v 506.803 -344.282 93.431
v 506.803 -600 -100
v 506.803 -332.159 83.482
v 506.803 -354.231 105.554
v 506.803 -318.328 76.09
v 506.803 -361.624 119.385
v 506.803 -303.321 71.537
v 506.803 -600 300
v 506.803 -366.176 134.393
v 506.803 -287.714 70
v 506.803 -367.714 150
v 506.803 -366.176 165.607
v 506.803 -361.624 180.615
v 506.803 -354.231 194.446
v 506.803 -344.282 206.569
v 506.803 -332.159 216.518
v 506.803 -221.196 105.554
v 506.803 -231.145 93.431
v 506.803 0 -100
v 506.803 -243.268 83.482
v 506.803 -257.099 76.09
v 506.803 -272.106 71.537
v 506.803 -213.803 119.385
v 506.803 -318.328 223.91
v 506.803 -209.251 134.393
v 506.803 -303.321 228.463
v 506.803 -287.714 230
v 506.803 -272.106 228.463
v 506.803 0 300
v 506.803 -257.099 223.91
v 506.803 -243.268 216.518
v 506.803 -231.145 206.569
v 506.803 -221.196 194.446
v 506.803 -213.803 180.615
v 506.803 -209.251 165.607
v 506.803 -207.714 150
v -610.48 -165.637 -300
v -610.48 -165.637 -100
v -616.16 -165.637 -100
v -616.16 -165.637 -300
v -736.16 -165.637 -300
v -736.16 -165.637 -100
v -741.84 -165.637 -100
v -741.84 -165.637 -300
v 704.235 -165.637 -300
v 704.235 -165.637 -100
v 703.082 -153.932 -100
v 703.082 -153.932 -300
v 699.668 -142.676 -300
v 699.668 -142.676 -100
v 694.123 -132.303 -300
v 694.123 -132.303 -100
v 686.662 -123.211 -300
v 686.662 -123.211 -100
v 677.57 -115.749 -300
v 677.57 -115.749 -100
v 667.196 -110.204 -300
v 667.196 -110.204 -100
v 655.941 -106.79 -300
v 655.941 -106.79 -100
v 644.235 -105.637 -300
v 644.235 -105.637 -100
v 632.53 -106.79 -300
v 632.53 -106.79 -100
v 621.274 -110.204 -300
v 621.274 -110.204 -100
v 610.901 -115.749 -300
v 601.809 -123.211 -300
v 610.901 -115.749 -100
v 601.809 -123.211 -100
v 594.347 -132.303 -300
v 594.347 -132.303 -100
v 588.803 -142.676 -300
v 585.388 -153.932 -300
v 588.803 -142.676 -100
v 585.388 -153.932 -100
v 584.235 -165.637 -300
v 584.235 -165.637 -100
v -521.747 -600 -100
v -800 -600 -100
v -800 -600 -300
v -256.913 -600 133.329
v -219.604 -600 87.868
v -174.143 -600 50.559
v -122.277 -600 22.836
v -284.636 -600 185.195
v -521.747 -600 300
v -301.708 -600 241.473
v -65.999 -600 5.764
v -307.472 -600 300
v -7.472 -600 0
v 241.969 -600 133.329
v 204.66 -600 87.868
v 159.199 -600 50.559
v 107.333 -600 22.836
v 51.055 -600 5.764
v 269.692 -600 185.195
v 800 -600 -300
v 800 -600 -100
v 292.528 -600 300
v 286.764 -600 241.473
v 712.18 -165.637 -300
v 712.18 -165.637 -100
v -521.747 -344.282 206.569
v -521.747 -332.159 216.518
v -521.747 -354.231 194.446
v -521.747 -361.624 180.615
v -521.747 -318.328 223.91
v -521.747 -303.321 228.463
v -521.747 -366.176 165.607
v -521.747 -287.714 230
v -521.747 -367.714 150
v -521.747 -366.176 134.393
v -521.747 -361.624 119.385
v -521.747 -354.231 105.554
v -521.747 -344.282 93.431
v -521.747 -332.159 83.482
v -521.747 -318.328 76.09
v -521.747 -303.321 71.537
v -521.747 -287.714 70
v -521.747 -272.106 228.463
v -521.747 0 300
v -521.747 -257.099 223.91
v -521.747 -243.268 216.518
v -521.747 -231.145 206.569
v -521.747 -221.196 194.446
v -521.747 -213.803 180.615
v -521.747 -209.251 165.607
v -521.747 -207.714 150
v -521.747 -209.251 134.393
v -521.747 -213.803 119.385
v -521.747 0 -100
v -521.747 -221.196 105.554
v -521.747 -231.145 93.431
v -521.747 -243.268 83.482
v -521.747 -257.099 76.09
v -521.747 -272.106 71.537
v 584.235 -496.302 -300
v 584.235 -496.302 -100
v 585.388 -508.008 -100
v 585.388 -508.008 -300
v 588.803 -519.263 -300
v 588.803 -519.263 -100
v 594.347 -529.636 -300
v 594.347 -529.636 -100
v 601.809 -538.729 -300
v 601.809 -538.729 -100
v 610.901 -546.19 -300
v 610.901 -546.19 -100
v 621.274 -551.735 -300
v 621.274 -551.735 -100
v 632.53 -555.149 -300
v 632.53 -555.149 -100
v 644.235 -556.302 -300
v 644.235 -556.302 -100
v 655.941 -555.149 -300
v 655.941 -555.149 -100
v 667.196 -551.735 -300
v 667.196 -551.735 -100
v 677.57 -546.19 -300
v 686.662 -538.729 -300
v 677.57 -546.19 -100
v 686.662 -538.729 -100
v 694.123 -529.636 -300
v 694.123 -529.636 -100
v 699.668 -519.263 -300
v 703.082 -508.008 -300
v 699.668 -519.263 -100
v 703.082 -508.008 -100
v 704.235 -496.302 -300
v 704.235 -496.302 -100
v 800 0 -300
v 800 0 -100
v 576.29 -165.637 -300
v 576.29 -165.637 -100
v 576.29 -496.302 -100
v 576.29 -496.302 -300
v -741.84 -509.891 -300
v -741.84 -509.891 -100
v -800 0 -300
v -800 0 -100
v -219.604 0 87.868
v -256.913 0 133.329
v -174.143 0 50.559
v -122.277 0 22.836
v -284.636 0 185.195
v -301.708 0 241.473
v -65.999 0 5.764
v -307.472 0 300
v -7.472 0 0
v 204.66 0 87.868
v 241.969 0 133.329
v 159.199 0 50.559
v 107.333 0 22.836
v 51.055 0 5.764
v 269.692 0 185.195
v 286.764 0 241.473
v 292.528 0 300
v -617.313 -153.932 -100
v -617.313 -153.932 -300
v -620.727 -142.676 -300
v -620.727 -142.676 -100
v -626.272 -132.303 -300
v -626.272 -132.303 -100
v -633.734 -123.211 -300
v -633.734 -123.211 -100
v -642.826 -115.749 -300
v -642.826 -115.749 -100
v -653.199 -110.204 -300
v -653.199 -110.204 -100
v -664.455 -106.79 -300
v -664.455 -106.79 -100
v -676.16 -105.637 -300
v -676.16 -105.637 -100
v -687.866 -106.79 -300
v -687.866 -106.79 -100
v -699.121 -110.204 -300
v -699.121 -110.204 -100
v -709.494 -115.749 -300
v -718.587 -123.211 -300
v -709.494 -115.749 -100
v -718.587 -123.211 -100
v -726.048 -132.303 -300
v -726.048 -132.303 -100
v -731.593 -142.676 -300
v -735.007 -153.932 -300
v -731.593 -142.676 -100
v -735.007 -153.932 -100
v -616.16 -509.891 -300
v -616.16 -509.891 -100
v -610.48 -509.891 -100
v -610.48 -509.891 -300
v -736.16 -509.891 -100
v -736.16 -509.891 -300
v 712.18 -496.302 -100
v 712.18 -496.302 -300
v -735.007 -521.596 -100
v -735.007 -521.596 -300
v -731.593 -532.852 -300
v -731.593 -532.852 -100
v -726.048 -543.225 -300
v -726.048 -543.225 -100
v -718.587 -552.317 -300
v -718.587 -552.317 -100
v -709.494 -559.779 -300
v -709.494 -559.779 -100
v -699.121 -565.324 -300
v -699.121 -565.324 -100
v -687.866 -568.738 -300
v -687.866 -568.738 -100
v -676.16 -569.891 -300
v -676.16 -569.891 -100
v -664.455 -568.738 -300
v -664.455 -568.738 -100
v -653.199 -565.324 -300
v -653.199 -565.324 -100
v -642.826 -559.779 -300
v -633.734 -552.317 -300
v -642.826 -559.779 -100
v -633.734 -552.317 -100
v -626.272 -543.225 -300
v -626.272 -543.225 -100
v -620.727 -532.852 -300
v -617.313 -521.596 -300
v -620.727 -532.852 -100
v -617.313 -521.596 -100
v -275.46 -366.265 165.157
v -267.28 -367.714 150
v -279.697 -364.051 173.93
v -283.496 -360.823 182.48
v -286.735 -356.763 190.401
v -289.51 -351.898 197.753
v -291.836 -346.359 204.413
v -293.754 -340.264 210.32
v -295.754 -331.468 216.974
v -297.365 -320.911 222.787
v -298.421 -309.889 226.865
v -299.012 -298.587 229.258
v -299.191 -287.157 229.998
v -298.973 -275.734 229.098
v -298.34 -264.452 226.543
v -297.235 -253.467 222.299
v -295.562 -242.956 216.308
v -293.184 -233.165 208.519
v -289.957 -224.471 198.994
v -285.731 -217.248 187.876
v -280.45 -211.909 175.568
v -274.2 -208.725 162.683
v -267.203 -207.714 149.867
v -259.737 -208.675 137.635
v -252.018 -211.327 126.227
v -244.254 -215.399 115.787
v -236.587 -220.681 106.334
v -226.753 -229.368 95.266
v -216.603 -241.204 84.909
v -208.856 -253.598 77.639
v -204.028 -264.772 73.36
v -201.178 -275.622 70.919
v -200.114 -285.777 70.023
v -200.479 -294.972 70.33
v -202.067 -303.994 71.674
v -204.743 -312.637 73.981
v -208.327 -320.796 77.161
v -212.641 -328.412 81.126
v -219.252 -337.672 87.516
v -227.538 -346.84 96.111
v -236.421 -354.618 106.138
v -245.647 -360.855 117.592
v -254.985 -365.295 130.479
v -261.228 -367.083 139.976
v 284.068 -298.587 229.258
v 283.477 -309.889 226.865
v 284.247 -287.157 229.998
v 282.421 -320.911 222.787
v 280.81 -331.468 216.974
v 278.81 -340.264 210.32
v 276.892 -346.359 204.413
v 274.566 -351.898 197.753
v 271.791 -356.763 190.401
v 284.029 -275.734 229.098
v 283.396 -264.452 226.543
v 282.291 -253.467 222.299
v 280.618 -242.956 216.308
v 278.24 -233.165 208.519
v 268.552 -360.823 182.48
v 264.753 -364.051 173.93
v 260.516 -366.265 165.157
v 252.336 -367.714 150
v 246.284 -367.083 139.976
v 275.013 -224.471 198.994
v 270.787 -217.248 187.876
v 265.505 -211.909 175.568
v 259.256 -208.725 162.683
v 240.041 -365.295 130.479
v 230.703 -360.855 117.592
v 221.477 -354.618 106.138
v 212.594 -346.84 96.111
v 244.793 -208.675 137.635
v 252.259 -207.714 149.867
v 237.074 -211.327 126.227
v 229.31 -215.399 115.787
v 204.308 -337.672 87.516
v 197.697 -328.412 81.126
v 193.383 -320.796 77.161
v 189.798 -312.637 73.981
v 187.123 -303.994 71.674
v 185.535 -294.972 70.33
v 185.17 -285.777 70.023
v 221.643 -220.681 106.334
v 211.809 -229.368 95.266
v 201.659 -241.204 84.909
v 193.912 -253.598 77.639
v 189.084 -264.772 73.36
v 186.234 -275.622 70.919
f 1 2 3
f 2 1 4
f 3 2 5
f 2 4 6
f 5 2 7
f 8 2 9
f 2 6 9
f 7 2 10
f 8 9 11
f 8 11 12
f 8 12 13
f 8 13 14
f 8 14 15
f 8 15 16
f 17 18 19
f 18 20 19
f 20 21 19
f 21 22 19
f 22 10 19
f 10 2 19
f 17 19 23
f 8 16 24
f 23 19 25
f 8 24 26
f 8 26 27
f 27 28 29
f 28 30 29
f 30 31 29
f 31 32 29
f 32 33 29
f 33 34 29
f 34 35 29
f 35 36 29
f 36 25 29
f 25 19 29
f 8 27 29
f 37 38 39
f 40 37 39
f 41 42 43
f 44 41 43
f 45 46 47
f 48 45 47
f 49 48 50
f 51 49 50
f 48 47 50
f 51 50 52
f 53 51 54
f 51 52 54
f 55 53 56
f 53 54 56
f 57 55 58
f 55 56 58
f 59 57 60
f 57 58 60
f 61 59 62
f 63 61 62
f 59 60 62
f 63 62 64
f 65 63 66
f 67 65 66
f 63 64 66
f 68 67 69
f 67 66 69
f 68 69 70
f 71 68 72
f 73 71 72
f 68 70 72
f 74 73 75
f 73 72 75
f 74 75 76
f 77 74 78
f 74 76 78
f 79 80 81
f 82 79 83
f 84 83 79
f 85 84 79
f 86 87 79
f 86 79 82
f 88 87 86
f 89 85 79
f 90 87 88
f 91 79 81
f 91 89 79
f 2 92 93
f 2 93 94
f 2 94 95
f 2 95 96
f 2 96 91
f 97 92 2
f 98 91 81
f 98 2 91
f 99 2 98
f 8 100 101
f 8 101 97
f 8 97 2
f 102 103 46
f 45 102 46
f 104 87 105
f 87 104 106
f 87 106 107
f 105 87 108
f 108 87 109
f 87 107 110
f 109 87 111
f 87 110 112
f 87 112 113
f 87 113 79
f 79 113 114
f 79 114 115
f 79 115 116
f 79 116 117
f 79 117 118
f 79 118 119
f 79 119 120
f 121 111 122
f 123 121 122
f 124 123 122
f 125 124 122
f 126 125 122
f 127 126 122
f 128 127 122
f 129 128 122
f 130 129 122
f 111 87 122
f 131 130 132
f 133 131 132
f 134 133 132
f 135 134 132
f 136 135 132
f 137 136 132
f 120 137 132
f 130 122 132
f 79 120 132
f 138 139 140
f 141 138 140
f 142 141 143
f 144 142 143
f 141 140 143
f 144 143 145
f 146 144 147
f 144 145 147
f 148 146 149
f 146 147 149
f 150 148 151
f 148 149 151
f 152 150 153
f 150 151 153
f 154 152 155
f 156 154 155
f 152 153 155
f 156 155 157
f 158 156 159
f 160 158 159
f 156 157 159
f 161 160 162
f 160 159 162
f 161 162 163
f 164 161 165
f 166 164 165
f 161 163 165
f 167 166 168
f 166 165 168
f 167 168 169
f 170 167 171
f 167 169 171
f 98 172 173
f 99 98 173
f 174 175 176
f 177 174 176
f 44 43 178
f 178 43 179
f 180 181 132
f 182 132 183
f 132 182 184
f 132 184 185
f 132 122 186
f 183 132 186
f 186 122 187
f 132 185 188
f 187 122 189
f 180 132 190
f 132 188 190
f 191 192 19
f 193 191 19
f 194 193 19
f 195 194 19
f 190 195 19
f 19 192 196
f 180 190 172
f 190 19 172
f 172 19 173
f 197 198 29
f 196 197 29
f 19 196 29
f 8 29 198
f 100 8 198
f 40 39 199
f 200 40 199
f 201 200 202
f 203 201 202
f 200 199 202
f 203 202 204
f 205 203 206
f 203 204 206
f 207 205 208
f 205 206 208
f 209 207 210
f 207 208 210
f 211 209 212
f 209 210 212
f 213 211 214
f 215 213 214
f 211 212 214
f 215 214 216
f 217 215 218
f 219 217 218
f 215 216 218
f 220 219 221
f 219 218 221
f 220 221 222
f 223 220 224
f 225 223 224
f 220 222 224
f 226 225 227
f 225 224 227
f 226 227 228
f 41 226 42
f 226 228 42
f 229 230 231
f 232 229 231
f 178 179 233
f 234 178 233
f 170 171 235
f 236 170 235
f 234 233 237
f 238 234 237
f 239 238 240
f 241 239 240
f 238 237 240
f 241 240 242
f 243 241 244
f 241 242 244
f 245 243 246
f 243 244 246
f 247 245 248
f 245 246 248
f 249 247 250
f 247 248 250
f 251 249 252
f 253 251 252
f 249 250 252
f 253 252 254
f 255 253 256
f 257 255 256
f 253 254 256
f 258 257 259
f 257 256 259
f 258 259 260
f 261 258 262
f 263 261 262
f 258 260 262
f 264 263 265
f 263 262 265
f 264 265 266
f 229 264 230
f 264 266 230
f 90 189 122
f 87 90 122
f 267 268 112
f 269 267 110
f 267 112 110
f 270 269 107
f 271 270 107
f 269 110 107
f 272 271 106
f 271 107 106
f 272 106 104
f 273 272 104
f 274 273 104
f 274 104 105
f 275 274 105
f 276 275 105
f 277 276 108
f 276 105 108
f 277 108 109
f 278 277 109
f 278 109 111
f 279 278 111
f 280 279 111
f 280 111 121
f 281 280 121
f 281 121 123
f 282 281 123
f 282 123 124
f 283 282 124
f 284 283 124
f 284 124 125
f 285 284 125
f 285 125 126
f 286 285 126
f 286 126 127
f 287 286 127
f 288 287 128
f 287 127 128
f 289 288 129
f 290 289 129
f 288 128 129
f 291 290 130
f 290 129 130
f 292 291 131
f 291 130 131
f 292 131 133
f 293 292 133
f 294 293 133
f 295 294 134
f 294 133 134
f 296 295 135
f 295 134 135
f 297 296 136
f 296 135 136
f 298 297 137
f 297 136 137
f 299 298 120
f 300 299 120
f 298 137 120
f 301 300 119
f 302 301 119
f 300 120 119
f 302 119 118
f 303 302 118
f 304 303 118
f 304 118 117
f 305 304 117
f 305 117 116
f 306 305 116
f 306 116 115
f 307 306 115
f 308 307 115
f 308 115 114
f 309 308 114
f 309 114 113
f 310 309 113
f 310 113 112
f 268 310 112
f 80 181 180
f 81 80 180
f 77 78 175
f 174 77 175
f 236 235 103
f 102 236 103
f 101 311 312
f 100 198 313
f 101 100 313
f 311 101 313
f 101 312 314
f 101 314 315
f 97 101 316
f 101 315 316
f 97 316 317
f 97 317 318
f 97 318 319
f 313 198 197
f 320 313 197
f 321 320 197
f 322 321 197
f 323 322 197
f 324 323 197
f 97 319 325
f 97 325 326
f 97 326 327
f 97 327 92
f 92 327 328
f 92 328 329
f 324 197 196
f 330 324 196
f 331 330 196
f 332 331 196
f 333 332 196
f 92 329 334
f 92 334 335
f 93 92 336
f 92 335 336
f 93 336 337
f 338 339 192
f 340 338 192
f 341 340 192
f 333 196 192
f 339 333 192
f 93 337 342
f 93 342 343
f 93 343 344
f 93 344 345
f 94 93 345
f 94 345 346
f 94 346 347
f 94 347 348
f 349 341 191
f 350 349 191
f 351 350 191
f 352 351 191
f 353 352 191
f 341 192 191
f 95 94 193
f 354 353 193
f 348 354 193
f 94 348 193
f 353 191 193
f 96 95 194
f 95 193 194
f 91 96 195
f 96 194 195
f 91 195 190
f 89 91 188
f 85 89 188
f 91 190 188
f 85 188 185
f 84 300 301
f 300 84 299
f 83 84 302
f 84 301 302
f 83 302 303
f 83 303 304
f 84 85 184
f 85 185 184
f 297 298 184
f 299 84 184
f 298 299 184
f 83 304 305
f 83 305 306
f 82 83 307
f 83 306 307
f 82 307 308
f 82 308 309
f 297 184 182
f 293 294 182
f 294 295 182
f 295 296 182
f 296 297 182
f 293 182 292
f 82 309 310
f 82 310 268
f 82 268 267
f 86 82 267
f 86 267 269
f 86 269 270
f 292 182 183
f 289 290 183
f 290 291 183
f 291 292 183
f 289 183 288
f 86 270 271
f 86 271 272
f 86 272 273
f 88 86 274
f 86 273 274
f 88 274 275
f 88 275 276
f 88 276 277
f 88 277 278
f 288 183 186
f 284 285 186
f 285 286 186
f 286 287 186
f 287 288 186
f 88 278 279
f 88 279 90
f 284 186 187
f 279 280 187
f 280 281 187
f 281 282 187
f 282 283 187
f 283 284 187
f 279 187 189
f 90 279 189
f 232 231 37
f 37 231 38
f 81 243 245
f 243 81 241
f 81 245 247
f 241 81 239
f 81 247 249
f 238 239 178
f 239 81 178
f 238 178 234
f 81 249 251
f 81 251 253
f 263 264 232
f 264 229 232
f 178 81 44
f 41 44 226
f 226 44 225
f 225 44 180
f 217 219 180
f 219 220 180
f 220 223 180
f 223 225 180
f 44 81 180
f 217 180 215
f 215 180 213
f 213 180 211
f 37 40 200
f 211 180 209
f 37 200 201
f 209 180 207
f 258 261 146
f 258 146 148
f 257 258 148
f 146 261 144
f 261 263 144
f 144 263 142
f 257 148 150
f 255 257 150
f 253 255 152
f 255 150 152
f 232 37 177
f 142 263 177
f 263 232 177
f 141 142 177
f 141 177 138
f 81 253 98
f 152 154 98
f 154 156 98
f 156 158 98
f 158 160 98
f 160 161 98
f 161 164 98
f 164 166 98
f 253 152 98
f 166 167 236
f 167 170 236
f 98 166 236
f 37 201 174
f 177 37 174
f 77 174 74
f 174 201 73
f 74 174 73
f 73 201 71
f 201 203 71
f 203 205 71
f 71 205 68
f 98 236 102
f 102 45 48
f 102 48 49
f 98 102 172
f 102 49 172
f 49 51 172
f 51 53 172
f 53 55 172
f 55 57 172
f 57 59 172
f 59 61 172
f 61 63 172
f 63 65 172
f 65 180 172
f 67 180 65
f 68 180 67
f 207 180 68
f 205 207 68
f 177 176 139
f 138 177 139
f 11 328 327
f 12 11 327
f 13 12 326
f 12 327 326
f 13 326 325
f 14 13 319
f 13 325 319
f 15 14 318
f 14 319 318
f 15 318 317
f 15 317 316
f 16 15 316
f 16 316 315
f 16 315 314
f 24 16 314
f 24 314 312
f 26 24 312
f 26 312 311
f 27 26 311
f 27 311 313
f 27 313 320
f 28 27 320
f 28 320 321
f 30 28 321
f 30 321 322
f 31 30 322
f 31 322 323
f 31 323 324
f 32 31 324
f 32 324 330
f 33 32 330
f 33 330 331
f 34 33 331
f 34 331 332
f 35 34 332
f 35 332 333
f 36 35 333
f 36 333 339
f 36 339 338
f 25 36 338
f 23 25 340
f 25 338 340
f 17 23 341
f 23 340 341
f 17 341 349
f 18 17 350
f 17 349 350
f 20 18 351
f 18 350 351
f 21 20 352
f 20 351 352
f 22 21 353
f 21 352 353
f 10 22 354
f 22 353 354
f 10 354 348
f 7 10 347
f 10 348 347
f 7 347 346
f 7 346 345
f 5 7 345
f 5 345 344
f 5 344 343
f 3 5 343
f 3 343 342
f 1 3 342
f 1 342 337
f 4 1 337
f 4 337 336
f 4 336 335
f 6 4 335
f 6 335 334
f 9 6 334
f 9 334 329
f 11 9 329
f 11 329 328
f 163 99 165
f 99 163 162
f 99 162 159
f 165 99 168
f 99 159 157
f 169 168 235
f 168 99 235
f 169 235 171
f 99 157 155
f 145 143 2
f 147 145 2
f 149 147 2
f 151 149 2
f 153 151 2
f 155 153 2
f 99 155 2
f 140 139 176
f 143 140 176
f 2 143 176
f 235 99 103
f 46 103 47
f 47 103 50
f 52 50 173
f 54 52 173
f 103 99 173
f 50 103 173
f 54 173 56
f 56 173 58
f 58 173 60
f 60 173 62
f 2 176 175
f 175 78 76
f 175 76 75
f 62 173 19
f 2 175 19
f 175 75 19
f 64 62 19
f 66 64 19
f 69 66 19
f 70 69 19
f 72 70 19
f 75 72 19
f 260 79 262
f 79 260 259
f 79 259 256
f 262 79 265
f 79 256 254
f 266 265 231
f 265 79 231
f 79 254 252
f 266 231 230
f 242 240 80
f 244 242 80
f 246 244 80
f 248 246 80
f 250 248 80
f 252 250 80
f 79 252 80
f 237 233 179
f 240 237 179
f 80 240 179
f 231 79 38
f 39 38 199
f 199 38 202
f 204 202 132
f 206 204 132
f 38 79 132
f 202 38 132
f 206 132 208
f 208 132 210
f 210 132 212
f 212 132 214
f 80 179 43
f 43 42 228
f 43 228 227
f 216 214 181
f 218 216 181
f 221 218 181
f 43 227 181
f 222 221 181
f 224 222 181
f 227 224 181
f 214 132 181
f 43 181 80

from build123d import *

# Parameters (mm, degrees)
F1_DEPTH = 600
F2_R     = 80
F3_DEPTH = 1321.7481718788
F5_DEPTH = 200.001
F6_DEPTH = 200.001


# Not quite as in the source:
# - a feature names something its author has since deleted; it is built from what else it names


with BuildPart() as f1:
    # F0 (on Front) → F1 (new body)
    with BuildSketch(Plane.XZ):
        with BuildLine():
            Line((506.8030357361, -100), (506.8030357361, 300))
            Line((506.8030357361, 300), (292.5279319286, 300))
            ThreePointArc((292.5279319286, 300), (-7.4720680714, 0), (-307.4720680714, 300))
            Line((-307.4720680714, 300), (-521.7471718788, 300))
            Line((-521.7471718788, 300), (-521.7471718788, -100))
            Line((-521.7471718788, -100), (-800, -100))
            Line((-800, -100), (-800, -300))
            Line((-800, -300), (800, -300))
            Line((800, -300), (800, -100))
            Line((800, -100), (506.8030357361, -100))
        make_face()
    extrude(amount=F1_DEPTH)

    # F2 (on face) → F3 (cut, through all)
    with BuildSketch(Plane(origin=(-521.7471718788, 0, 0), x_dir=(0, -1, 0), z_dir=(-1, 0, 0))):
        with Locations((287.7135872841, 150)):
            Circle(F2_R)
    extrude(amount=-F3_DEPTH, mode=Mode.SUBTRACT)

    # F4 (on face) → F5 (cut, through all)
    with BuildSketch(Plane.XY.offset(-100)):
        with BuildLine():
            Line((-610.4801893234, -509.8910629749), (-610.4801893234, -165.6369864941))
            Line((-610.4801893234, -165.6369864941), (-616.1602163315, -165.6369864941))
            ThreePointArc((-616.1602163315, -165.6369864941), (-676.1602163315, -105.6369864941), (-736.1602163315, -165.6369864941))
            Line((-736.1602163315, -165.6369864941), (-741.8402433395, -165.6369864941))
            Line((-741.8402433395, -165.6369864941), (-741.8402433395, -509.8910629749))
            Line((-741.8402433395, -509.8910629749), (-736.1602163315, -509.8910629749))
            ThreePointArc((-736.1602163315, -509.8910629749), (-676.1602163315, -569.8910629749), (-616.1602163315, -509.8910629749))
            Line((-616.1602163315, -509.8910629749), (-610.4801893234, -509.8910629749))
        make_face()
        with BuildLine():
            Line((704.2353129387, -496.3020980358), (712.1801376343, -496.3020980358))
            Line((712.1801376343, -496.3020980358), (712.1801376343, -165.6369864941))
            Line((712.1801376343, -165.6369864941), (704.2353129387, -165.6369864941))
            ThreePointArc((704.2353129387, -165.6369864941), (644.2353129387, -105.6369864941), (584.2353129387, -165.6369864941))
            Line((584.2353129387, -165.6369864941), (576.2904882431, -165.6369864941))
            Line((576.2904882431, -165.6369864941), (576.2904882431, -496.3020980358))
            Line((576.2904882431, -496.3020980358), (584.2353129387, -496.3020980358))
            ThreePointArc((584.2353129387, -496.3020980358), (644.2353129387, -556.3020980358), (704.2353129387, -496.3020980358))
        make_face()
    extrude(amount=-F5_DEPTH, mode=Mode.SUBTRACT)

    # F4 (on face) → F6 (cut, through all)
    with BuildSketch(Plane.XY.offset(-100)):
        with BuildLine():
            Line((-610.4801893234, -509.8910629749), (-610.4801893234, -165.6369864941))
            Line((-610.4801893234, -165.6369864941), (-616.1602163315, -165.6369864941))
            ThreePointArc((-616.1602163315, -165.6369864941), (-676.1602163315, -105.6369864941), (-736.1602163315, -165.6369864941))
            Line((-736.1602163315, -165.6369864941), (-741.8402433395, -165.6369864941))
            Line((-741.8402433395, -165.6369864941), (-741.8402433395, -509.8910629749))
            Line((-741.8402433395, -509.8910629749), (-736.1602163315, -509.8910629749))
            ThreePointArc((-736.1602163315, -509.8910629749), (-676.1602163315, -569.8910629749), (-616.1602163315, -509.8910629749))
            Line((-616.1602163315, -509.8910629749), (-610.4801893234, -509.8910629749))
        make_face()
        with BuildLine():
            Line((704.2353129387, -496.3020980358), (712.1801376343, -496.3020980358))
            Line((712.1801376343, -496.3020980358), (712.1801376343, -165.6369864941))
            Line((712.1801376343, -165.6369864941), (704.2353129387, -165.6369864941))
            ThreePointArc((704.2353129387, -165.6369864941), (644.2353129387, -105.6369864941), (584.2353129387, -165.6369864941))
            Line((584.2353129387, -165.6369864941), (576.2904882431, -165.6369864941))
            Line((576.2904882431, -165.6369864941), (576.2904882431, -496.3020980358))
            Line((576.2904882431, -496.3020980358), (584.2353129387, -496.3020980358))
            ThreePointArc((584.2353129387, -496.3020980358), (644.2353129387, -556.3020980358), (704.2353129387, -496.3020980358))
        make_face()
    extrude(amount=-F6_DEPTH, mode=Mode.SUBTRACT)


solid = f1.part
